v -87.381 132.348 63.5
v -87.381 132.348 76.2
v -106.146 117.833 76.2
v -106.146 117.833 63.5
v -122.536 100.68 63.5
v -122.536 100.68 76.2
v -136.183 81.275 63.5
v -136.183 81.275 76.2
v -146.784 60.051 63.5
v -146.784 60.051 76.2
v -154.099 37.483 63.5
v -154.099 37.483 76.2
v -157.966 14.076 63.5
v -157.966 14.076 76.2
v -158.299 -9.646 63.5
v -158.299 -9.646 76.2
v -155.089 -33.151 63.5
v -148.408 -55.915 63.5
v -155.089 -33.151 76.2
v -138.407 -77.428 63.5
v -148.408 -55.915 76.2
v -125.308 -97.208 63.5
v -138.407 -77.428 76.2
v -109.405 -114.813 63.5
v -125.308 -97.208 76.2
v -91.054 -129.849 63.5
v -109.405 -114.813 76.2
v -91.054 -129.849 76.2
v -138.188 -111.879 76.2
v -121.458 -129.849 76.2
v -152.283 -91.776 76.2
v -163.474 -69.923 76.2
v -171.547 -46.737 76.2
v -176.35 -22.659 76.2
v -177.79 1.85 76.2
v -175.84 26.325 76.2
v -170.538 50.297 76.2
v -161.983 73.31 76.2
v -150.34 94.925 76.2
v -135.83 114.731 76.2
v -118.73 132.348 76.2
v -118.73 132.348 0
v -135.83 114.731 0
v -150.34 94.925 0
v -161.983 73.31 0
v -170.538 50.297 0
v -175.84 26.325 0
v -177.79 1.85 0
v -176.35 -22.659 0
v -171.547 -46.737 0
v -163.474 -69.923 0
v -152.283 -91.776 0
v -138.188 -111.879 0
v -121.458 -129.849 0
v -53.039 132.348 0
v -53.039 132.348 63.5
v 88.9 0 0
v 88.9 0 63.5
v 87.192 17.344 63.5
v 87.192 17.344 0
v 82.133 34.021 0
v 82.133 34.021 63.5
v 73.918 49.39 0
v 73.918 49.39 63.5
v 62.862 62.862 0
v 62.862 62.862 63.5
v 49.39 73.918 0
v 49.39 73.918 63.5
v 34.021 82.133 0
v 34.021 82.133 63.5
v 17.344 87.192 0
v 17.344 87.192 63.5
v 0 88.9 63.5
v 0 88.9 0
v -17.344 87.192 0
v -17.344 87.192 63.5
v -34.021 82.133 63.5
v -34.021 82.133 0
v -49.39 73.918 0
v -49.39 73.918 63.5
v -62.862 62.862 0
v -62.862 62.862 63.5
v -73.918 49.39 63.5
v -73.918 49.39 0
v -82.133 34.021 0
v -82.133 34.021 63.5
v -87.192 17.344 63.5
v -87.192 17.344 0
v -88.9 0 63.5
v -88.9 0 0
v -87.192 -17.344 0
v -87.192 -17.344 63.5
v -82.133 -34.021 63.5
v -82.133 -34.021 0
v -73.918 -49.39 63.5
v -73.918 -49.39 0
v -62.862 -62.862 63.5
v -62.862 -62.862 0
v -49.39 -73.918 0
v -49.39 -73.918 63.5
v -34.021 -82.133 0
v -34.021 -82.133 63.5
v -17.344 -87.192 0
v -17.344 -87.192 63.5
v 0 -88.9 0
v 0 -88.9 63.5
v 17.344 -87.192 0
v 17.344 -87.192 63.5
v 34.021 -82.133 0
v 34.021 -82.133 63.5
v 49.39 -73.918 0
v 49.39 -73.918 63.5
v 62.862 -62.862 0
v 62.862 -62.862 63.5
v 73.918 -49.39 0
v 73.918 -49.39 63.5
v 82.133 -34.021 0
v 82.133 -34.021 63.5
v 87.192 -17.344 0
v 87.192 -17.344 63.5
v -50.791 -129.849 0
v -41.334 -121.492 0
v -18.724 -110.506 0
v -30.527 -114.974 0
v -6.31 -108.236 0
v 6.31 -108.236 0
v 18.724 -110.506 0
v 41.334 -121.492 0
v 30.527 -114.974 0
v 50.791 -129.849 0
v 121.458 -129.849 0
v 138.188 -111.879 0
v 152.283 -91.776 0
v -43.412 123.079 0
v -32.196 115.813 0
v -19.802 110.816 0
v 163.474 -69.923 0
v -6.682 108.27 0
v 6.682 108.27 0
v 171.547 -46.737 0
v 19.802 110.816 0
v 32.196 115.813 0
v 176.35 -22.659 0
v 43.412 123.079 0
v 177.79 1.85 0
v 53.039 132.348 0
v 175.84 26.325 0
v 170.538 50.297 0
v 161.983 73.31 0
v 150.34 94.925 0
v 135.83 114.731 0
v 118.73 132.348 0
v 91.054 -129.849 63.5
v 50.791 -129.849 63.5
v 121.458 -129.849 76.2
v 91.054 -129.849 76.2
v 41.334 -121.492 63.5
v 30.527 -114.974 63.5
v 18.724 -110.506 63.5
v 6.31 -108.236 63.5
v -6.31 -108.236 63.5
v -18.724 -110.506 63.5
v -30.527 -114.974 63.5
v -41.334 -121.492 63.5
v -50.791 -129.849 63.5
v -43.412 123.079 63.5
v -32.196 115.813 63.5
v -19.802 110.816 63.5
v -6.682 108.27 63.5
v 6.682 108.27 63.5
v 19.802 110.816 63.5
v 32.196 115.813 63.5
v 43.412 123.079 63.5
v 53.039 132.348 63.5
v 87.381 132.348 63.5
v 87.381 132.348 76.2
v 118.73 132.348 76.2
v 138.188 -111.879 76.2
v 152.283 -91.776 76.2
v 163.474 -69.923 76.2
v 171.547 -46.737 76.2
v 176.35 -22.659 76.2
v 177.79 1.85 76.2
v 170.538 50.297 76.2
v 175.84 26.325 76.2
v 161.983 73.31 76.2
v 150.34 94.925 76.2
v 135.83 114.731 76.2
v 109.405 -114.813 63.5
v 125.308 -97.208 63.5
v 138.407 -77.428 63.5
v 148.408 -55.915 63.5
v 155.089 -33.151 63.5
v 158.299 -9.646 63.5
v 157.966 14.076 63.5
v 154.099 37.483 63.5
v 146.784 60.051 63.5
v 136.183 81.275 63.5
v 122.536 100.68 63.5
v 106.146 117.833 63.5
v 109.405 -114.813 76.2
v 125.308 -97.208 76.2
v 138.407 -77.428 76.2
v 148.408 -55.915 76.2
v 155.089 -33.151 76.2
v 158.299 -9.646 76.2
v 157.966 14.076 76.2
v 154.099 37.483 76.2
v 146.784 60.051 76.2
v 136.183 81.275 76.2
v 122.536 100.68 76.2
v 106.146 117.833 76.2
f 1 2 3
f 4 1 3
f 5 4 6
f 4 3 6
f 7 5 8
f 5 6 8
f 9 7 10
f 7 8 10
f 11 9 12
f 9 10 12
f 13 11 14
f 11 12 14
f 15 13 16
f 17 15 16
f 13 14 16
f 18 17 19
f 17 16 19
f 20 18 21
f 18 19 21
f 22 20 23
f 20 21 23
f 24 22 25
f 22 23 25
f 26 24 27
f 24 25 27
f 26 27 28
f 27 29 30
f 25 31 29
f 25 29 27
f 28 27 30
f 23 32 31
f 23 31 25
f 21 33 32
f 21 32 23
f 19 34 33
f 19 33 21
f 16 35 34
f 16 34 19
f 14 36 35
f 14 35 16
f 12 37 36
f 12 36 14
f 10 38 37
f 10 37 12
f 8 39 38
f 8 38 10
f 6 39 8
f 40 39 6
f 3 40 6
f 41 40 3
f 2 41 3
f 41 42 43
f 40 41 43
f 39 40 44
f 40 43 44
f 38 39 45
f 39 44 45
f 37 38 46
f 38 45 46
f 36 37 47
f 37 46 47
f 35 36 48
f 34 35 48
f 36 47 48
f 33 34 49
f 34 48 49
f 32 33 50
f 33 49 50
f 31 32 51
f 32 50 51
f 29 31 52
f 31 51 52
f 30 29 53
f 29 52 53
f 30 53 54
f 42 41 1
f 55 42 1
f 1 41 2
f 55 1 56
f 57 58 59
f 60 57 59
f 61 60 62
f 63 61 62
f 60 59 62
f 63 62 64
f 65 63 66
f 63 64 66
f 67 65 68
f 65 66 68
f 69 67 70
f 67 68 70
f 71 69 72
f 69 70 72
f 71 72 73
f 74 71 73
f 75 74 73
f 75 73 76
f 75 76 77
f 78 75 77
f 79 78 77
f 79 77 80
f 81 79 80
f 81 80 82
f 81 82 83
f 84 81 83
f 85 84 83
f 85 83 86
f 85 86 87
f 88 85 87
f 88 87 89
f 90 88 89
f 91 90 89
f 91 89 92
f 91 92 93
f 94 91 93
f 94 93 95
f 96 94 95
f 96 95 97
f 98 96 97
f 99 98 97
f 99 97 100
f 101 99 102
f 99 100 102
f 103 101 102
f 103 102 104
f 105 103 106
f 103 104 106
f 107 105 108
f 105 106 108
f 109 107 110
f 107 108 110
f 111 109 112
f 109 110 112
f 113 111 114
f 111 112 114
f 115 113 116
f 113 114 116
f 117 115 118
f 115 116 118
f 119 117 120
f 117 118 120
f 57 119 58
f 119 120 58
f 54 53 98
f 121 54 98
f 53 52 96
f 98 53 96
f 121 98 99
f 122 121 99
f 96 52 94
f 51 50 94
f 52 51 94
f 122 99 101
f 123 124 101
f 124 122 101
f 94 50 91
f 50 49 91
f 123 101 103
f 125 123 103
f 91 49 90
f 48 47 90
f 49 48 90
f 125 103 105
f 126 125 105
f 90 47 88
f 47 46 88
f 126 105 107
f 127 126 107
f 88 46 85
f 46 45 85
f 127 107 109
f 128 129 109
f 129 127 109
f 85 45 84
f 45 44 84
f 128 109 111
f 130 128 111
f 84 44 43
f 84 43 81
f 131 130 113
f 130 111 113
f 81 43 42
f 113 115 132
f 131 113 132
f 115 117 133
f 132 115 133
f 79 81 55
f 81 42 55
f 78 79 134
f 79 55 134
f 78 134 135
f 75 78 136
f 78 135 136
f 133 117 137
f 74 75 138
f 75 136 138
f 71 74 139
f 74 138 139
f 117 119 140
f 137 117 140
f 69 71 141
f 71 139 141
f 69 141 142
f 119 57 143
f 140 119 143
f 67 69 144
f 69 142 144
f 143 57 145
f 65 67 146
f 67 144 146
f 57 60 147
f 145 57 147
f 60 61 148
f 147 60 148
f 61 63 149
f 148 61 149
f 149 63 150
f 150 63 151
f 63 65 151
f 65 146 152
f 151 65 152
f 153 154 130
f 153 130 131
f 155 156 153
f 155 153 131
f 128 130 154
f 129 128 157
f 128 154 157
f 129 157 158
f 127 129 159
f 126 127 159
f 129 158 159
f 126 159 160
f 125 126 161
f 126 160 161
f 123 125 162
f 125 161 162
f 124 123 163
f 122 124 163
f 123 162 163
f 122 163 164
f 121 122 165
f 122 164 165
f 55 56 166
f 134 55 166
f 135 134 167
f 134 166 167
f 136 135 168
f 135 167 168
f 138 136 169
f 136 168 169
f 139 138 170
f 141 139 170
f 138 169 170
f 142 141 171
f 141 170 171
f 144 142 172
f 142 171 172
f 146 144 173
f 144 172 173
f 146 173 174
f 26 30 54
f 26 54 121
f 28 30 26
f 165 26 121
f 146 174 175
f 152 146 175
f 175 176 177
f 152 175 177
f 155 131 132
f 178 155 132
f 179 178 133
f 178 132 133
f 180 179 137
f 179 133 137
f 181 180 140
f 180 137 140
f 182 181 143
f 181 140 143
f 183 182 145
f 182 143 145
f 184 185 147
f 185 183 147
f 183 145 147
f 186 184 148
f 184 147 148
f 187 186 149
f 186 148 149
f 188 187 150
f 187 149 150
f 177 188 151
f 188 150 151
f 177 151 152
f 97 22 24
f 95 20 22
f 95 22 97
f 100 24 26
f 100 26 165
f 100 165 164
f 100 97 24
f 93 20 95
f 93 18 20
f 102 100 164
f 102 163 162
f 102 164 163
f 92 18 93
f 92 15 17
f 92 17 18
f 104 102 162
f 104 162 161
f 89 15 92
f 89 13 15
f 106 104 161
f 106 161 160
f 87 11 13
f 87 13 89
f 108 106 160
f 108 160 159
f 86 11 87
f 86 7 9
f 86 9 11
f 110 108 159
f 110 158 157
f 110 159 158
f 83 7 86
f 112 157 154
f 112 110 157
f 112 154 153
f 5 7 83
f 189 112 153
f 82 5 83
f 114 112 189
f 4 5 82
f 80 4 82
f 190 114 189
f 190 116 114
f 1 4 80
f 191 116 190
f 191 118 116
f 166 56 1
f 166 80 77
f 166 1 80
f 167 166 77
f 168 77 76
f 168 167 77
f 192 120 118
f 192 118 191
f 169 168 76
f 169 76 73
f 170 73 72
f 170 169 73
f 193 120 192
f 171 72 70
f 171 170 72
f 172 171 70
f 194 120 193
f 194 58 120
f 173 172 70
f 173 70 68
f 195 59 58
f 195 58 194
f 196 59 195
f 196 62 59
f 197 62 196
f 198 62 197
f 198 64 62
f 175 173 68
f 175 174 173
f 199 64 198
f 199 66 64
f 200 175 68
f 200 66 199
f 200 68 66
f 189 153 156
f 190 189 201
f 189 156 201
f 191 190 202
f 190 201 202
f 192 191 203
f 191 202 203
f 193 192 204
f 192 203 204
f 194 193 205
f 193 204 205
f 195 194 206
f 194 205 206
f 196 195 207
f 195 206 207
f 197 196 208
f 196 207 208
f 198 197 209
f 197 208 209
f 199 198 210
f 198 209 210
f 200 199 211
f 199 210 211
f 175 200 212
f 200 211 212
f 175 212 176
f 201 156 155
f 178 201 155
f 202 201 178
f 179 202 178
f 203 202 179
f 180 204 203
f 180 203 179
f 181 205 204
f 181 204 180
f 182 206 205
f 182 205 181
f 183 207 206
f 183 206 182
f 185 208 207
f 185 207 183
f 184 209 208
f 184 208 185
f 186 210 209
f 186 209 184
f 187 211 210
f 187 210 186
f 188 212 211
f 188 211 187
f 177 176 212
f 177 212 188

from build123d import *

# Parameters (mm, degrees)
F0_R     = 177.8
F1_DEPTH = 76.2
F2_R     = 88.9
F3_DEPTH = 254
F4_R     = 69.85
F5_DEPTH = 254
F6_W     = 462.104425
F6_H     = 46.355292
F6_W_2   = 466.450229
F6_H_2   = 34.23076
F7_DEPTH = 254
F8_R     = 158.592368
F9_DEPTH = 12.7


with BuildPart() as f1:
    # F0 (on Top) → F1 (new body)
    with BuildSketch(Plane.XY):
        Circle(F0_R)
    extrude(amount=F1_DEPTH)

    # F2 (on face) → F3 (cut)
    with BuildSketch(Plane.XY.offset(76.2)):
        Circle(F2_R)
    extrude(amount=-F3_DEPTH, mode=Mode.SUBTRACT)

    # F4 (on face) → F5 (cut)
    with BuildSketch(Plane.XY.offset(76.2)):
        with Locations((0, 177.8)):
            Circle(F4_R)
        with Locations((0, -177.8)):
            Circle(F4_R)
    extrude(amount=-F5_DEPTH, mode=Mode.SUBTRACT)

    # F6 (on face) → F7 (cut)
    with BuildSketch(Plane.XY.offset(76.2)):
        with Locations((-1.086809, 155.526124)):
            Rectangle(F6_W, F6_H)
        with Locations((1.086094, -146.964084)):
            Rectangle(F6_W_2, F6_H_2)
    extrude(amount=-F7_DEPTH, mode=Mode.SUBTRACT)

    # F8 (on face) → F9 (cut)
    with BuildSketch(Plane.XY.offset(76.2)):
        Circle(F8_R)
    extrude(amount=-F9_DEPTH, mode=Mode.SUBTRACT)


solid = f1.part
